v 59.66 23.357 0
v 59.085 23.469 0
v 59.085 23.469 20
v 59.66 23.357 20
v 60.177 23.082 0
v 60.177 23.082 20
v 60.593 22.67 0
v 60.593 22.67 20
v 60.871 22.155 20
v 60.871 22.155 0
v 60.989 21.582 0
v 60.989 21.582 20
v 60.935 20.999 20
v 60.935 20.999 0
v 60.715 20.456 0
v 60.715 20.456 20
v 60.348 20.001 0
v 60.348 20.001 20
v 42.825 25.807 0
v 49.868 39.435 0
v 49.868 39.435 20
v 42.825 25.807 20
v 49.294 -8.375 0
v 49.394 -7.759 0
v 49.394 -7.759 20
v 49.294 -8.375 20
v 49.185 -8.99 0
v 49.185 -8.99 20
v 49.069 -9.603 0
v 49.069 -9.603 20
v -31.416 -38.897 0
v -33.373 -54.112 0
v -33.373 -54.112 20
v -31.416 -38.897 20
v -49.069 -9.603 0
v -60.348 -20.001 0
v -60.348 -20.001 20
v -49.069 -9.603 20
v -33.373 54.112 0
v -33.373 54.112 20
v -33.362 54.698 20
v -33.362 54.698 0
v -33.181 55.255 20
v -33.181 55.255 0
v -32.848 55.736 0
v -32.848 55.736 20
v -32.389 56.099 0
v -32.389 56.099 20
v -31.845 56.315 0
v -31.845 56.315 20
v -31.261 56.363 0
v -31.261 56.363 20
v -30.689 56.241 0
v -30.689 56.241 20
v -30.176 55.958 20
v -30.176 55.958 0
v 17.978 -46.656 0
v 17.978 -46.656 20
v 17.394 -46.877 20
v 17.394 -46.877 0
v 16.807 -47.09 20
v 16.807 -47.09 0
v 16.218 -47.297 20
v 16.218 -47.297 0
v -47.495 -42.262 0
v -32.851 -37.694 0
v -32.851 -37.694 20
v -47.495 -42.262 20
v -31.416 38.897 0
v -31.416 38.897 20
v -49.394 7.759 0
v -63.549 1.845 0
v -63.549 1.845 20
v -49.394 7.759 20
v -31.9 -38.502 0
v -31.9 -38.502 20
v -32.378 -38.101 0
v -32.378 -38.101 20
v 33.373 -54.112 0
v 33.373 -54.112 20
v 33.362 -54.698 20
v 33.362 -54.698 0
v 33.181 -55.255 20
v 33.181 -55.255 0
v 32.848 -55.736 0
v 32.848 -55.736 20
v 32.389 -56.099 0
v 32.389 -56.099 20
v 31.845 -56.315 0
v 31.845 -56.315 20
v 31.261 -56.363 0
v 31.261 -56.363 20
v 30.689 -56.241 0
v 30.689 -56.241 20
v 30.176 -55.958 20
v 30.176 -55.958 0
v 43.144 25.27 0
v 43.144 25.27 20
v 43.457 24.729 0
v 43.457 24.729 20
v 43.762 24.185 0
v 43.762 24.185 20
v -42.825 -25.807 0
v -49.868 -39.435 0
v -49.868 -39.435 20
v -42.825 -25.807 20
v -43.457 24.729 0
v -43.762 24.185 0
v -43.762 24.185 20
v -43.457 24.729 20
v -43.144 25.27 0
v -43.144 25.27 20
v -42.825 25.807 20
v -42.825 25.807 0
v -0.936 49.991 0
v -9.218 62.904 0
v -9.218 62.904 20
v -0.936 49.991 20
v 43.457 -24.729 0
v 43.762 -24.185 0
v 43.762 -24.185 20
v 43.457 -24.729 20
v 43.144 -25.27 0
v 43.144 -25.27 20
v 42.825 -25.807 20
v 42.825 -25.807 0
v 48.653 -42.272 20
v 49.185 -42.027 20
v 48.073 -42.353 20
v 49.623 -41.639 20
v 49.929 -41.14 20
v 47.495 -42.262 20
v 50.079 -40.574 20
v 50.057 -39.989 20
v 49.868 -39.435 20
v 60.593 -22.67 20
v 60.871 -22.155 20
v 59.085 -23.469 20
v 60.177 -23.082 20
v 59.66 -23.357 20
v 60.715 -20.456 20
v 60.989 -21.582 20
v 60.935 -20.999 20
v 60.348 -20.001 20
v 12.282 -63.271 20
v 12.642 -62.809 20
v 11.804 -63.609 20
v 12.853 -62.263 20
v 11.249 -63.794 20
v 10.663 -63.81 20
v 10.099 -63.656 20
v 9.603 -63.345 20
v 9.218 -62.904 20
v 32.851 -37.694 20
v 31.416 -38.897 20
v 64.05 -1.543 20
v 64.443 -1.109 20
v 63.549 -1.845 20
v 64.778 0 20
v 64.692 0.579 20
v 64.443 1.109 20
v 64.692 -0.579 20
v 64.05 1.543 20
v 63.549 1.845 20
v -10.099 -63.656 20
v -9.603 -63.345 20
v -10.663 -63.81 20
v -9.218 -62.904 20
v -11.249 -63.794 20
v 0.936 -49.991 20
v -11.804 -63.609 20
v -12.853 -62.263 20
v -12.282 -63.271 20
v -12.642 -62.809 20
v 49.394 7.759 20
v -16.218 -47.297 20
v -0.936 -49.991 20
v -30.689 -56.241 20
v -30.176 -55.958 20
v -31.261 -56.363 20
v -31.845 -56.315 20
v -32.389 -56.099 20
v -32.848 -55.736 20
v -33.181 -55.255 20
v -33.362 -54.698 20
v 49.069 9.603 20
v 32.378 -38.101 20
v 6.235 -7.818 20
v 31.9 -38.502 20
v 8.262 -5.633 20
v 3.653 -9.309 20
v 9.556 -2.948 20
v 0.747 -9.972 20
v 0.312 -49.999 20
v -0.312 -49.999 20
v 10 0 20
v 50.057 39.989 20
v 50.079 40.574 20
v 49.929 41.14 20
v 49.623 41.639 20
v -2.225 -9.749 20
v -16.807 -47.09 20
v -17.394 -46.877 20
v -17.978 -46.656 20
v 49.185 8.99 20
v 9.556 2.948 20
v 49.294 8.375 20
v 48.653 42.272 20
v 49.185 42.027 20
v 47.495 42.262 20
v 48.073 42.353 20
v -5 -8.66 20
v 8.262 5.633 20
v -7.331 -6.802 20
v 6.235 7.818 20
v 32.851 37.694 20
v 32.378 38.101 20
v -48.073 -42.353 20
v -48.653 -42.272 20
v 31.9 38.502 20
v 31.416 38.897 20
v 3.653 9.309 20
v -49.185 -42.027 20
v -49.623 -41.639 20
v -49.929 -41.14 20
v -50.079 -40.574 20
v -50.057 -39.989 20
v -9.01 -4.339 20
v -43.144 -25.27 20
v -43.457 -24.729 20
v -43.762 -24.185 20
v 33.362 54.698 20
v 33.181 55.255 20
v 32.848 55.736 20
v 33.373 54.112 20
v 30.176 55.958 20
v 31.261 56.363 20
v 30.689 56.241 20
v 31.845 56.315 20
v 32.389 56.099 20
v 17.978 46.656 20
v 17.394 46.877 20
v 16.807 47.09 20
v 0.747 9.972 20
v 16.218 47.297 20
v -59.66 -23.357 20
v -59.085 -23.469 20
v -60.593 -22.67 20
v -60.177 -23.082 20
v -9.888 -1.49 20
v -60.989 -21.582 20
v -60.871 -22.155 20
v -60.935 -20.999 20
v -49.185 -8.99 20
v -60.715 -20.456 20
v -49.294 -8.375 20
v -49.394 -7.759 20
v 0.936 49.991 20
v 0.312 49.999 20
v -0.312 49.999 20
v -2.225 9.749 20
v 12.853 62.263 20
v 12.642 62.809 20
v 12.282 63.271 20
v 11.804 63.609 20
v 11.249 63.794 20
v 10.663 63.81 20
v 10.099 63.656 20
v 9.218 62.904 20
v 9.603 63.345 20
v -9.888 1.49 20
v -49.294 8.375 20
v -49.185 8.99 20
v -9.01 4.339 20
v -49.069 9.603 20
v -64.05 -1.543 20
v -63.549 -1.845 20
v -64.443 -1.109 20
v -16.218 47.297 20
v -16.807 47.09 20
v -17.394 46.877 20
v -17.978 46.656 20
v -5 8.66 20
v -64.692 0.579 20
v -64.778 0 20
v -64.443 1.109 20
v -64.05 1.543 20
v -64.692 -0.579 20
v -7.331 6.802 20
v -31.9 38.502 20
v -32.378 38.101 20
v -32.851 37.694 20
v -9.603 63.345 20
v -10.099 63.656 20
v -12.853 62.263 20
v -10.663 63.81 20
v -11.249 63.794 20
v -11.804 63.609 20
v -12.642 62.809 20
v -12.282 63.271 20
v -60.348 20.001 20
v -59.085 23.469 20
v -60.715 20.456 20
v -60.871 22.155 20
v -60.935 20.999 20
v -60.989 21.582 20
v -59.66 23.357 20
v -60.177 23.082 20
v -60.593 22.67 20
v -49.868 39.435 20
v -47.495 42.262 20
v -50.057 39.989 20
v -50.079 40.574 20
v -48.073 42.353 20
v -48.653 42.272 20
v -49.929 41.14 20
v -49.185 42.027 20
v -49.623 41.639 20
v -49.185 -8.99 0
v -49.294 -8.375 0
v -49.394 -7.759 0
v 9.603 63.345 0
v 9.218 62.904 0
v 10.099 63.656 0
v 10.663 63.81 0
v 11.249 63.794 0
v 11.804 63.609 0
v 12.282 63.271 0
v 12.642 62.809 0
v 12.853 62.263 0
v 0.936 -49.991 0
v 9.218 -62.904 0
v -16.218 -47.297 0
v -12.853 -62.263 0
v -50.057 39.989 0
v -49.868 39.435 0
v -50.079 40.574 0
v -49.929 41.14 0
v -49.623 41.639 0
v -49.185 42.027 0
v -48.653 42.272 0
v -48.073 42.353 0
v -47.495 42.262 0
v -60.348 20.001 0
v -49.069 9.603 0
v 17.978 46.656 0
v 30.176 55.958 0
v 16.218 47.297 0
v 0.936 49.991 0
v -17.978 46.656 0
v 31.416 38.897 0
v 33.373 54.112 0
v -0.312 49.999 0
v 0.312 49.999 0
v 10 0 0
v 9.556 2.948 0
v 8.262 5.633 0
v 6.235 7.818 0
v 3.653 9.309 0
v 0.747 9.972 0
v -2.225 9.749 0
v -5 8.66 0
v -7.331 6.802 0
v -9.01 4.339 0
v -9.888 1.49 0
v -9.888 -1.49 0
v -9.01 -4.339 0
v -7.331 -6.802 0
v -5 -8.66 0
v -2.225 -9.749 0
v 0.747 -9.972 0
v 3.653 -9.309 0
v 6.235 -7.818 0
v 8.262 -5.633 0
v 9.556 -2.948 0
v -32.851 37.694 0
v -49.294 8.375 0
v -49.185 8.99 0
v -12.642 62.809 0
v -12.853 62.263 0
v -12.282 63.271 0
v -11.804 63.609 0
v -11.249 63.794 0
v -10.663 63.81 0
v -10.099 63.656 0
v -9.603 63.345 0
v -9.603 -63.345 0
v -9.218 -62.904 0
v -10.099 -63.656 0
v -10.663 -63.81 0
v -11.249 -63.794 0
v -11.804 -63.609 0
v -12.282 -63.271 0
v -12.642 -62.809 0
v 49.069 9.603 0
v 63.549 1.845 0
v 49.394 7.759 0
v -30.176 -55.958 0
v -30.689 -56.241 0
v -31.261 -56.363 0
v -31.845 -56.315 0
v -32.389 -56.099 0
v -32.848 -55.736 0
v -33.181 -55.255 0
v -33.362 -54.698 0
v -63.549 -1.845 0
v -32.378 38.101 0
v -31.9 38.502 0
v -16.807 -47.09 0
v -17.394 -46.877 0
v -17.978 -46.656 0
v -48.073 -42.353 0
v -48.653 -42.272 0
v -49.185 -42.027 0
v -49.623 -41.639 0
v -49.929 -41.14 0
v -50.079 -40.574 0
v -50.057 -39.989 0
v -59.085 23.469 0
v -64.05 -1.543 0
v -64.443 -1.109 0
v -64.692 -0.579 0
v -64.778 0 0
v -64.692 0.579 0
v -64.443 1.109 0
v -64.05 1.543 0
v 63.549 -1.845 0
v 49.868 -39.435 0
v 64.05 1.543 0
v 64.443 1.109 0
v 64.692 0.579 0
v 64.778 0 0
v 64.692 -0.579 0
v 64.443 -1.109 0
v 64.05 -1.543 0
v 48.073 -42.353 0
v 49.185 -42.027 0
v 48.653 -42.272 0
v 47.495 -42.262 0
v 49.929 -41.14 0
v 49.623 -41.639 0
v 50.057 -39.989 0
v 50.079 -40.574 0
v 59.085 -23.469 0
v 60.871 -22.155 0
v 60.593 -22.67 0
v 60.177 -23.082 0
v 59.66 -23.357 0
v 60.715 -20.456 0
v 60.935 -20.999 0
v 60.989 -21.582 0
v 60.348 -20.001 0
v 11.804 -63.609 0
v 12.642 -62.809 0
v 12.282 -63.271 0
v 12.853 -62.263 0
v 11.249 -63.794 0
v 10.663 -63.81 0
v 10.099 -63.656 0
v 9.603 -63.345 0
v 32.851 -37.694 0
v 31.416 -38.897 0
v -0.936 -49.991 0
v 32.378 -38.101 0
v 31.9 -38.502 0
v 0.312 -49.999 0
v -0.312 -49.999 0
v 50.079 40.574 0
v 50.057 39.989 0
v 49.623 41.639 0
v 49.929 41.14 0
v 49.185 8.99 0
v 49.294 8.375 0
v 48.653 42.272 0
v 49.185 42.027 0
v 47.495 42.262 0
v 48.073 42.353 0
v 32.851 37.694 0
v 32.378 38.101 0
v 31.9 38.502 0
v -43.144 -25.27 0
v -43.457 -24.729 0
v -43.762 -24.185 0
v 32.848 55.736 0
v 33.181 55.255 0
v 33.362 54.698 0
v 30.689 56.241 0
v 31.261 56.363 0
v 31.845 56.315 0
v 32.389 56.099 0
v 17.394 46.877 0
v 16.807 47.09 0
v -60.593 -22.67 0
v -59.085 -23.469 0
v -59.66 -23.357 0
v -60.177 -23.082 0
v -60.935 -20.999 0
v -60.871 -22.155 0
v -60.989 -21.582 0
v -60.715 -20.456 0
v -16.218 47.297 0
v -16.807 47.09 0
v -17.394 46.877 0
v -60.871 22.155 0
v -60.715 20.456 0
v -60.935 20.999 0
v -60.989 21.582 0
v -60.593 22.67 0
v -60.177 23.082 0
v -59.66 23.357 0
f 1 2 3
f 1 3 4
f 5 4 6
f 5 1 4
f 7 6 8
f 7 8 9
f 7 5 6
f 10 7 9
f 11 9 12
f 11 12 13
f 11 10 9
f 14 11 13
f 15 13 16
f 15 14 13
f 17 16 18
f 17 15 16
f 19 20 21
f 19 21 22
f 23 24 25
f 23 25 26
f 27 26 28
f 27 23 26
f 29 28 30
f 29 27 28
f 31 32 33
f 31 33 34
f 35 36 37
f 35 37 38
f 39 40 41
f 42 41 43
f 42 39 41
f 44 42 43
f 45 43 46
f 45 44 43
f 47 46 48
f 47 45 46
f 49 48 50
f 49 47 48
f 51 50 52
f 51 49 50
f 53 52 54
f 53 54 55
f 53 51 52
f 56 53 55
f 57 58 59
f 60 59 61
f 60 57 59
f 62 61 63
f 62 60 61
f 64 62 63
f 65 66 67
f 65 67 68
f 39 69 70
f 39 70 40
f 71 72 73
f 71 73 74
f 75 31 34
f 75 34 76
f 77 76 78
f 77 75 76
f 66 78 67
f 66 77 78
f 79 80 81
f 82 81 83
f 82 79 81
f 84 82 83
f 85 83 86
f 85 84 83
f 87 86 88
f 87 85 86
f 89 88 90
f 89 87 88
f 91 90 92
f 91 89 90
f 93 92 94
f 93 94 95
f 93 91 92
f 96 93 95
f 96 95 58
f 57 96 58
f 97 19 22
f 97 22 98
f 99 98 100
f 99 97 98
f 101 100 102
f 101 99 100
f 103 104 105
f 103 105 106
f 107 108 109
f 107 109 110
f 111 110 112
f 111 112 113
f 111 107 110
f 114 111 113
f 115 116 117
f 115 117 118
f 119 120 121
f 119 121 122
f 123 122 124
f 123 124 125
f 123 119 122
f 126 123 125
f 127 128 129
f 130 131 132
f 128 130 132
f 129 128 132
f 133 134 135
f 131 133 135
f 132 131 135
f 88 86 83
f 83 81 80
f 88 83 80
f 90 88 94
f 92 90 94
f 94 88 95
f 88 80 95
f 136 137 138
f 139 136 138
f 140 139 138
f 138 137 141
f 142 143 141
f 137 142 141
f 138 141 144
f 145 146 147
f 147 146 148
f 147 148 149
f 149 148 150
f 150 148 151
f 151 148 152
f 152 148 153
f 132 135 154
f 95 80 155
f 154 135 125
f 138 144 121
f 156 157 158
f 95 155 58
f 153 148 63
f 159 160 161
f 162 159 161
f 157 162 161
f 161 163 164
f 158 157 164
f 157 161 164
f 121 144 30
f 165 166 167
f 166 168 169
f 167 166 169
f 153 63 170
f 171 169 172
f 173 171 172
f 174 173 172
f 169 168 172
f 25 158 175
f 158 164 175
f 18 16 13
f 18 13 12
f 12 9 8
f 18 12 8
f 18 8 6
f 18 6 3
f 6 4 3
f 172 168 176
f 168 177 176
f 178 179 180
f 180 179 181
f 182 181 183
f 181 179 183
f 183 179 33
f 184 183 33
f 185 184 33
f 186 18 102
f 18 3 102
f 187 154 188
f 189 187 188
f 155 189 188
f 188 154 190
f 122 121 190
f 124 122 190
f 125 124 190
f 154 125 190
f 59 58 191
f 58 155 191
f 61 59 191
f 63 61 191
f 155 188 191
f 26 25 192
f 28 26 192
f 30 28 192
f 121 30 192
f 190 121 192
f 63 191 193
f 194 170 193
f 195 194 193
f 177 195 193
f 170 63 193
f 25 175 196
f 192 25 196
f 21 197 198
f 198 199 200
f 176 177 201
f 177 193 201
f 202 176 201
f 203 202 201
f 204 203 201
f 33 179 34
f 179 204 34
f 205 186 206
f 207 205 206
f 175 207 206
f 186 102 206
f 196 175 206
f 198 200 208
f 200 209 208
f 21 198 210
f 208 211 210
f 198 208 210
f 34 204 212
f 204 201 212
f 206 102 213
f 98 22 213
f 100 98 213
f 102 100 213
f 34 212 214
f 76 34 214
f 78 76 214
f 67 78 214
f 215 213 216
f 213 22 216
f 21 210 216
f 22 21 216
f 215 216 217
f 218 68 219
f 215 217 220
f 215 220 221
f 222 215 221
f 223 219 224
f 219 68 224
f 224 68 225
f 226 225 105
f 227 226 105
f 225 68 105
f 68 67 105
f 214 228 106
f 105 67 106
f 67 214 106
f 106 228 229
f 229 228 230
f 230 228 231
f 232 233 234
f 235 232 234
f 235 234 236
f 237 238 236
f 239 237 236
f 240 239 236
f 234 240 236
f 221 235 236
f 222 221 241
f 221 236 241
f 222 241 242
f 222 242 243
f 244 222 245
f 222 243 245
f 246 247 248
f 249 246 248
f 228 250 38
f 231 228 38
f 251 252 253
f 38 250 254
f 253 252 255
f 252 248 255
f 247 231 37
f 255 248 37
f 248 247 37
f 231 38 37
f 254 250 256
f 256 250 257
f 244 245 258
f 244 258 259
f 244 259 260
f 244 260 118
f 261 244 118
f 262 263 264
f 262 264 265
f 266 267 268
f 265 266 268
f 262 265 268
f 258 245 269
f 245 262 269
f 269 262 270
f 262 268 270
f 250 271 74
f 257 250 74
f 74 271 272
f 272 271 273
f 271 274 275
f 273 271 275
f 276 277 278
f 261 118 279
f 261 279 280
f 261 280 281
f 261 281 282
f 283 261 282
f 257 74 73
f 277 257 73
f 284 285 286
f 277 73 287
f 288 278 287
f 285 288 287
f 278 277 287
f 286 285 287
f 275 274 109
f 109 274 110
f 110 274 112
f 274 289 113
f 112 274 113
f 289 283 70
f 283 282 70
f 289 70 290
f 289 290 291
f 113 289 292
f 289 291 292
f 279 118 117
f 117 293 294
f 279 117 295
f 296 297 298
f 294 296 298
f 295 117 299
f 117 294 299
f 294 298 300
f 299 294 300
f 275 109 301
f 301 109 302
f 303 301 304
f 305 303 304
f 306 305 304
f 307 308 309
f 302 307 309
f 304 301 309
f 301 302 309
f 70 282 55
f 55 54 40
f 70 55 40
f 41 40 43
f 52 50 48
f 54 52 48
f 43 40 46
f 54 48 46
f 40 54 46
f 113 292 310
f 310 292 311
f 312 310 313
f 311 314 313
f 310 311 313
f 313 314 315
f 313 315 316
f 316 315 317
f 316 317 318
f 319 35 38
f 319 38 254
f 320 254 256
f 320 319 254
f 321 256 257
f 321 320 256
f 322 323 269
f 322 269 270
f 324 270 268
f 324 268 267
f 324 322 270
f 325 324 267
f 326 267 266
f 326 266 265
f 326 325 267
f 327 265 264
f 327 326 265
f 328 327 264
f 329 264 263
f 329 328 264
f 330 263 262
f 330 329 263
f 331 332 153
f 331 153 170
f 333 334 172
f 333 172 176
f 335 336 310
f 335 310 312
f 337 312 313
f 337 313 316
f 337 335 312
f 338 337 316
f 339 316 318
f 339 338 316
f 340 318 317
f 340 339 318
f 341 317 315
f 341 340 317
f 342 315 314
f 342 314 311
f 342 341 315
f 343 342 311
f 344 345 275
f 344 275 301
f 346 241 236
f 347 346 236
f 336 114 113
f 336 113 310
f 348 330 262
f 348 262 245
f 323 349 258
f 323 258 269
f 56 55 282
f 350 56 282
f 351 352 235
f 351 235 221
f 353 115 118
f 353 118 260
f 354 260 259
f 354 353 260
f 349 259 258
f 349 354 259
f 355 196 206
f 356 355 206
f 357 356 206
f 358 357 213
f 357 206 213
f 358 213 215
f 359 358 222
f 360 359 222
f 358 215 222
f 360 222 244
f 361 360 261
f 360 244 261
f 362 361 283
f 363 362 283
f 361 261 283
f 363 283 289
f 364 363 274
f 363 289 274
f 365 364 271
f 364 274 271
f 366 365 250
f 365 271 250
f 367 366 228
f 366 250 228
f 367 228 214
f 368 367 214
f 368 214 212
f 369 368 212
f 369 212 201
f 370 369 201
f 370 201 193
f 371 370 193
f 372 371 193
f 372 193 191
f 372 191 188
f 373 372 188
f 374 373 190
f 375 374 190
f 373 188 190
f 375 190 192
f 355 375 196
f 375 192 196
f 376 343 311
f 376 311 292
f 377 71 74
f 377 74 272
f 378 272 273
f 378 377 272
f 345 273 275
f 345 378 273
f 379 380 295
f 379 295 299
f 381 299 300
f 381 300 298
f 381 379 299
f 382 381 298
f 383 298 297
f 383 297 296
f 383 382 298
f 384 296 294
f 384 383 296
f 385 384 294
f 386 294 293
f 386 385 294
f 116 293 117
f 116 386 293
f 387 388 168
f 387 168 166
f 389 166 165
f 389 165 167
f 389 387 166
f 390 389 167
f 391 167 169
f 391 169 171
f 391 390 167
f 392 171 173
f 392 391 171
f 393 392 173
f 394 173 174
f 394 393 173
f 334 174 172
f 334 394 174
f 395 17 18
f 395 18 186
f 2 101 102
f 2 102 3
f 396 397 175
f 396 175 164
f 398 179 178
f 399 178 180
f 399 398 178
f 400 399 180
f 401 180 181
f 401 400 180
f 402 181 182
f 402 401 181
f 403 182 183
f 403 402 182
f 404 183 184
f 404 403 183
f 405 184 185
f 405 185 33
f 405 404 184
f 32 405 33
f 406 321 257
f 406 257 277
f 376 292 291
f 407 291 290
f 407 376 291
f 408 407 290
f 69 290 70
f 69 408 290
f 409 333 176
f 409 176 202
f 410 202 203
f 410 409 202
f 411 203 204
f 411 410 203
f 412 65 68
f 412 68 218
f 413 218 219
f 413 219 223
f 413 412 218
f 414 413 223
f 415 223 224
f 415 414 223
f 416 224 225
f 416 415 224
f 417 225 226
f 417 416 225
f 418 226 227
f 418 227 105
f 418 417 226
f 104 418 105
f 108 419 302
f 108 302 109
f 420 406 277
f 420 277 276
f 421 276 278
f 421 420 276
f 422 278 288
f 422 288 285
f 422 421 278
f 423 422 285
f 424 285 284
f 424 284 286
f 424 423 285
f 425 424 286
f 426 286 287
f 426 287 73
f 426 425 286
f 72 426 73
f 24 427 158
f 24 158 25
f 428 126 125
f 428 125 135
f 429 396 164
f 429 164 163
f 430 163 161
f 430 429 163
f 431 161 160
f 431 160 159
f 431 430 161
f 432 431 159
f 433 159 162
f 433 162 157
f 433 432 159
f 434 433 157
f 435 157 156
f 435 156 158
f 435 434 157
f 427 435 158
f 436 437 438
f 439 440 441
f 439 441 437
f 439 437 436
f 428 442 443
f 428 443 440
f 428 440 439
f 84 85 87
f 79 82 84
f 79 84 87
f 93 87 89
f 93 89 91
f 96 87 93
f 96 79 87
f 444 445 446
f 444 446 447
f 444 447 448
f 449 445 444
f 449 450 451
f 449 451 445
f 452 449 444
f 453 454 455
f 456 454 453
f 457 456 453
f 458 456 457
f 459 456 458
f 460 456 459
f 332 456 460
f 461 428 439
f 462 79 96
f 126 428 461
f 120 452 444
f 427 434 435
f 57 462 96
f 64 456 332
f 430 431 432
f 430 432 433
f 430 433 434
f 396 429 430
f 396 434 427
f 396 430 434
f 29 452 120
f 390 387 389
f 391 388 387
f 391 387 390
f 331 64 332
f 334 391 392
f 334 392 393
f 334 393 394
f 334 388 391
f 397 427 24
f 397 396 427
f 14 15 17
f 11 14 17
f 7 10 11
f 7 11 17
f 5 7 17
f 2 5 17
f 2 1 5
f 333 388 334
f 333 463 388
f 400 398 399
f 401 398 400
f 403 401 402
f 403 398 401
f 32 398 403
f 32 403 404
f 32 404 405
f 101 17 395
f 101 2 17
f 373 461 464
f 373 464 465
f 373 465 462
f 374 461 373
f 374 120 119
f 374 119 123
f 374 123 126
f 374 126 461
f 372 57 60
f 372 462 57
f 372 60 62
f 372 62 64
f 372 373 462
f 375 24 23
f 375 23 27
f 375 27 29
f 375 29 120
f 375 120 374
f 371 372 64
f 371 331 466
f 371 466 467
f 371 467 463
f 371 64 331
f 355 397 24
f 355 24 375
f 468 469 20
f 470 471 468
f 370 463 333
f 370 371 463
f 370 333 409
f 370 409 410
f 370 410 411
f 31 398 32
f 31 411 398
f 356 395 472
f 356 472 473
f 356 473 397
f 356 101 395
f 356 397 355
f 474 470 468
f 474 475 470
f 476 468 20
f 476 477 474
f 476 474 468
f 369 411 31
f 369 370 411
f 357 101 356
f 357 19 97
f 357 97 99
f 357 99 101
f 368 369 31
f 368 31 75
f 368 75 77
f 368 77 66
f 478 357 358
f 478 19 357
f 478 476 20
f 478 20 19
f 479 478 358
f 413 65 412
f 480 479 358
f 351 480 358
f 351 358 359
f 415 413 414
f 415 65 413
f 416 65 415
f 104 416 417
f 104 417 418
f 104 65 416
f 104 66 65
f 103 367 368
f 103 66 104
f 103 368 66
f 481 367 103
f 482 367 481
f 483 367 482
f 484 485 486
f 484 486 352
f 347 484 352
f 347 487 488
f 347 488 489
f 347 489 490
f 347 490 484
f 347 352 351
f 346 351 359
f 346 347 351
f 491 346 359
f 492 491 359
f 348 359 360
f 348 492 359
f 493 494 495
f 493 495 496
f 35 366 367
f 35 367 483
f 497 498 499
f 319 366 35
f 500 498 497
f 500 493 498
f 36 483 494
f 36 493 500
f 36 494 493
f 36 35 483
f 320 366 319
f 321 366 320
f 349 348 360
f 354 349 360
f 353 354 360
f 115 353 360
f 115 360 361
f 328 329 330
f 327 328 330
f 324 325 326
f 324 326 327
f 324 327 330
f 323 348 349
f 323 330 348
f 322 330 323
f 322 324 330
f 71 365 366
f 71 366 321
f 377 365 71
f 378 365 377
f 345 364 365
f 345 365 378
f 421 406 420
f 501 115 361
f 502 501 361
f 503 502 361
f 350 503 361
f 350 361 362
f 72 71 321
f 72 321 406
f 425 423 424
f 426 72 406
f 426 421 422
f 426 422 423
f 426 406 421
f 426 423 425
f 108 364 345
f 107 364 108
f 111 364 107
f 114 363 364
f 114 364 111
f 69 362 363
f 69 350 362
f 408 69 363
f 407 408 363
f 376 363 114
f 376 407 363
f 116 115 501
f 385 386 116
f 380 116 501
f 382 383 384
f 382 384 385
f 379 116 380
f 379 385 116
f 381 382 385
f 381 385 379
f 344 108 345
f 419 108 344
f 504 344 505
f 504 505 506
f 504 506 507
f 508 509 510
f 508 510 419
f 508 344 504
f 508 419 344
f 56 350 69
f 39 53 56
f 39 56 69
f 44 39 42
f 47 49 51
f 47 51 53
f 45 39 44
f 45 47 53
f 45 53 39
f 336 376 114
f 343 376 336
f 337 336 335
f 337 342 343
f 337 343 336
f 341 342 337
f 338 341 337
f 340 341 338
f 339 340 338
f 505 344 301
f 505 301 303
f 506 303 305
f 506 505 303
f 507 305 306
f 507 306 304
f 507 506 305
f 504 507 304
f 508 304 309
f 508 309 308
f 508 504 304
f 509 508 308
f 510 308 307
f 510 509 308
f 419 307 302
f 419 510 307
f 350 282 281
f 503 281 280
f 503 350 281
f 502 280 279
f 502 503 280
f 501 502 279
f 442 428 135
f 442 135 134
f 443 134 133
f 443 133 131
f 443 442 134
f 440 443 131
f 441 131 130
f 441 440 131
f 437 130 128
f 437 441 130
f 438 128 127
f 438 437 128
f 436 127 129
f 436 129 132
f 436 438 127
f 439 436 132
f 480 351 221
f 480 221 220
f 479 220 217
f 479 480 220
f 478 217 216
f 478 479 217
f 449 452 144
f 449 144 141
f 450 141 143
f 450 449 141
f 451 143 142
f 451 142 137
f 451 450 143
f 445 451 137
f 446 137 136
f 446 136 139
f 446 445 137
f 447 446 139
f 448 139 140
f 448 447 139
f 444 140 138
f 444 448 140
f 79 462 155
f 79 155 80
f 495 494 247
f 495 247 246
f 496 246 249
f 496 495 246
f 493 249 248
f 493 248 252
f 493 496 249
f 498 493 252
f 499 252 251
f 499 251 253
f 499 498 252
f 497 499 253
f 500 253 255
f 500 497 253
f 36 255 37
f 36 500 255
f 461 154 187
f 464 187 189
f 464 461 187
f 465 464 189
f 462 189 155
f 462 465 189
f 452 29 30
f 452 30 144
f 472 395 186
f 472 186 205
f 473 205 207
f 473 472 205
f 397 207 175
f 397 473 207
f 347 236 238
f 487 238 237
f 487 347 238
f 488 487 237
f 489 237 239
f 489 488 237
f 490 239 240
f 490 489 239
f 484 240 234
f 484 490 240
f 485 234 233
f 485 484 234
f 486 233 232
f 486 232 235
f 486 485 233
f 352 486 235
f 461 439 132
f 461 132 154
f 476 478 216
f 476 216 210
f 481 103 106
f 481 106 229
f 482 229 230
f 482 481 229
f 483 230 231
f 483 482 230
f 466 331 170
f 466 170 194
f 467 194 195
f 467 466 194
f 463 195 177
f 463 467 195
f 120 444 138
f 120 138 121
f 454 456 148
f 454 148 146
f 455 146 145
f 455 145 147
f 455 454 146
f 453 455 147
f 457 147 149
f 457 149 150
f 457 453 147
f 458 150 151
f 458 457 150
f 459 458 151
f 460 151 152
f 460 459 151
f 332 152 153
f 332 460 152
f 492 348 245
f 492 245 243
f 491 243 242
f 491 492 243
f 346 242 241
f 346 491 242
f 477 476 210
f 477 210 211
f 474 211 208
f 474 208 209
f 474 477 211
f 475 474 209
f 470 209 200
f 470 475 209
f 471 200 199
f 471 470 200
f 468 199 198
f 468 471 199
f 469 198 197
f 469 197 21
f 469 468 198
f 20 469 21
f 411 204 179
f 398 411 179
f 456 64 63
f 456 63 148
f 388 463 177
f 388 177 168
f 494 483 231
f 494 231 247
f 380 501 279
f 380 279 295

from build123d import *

# Parameters (mm, degrees)
EXTRUDE_1_DEPTH     = 20
SKETCH_2_R          = 10
CUT_EXTRUDE_1_DEPTH = 20


with BuildPart() as part:
    # 草圖1 → 填料-伸長1 (new body)
    with BuildSketch(Plane.XY):
        with BuildLine():
            Line((-63.548984366, 1.845434638), (-49.394355, 7.7587173))
            ThreePointArc((-49.394355, 7.7587173), (-49.240387651, 8.682408883), (-49.069148505, 9.603054983))
            Line((-49.069148505, 9.603054983), (-60.347687486, 20.00089143))
            ThreePointArc((-60.347687486, 20.00089143), (-60.871436558, 22.155391024), (-59.085335848, 23.469174052))
            Line((-59.085335848, 23.469174052), (-43.761873299, 24.18467377))
            ThreePointArc((-43.761873299, 24.18467377), (-43.301270189, 25), (-42.825478517, 25.806557109))
            Line((-42.825478517, 25.806557109), (-49.867568859, 39.434814809))
            ThreePointArc((-49.867568859, 39.434814809), (-49.622849737, 41.638514912), (-47.49512382, 42.262184708))
            Line((-47.49512382, 42.262184708), (-32.851063821, 37.693601656))
            ThreePointArc((-32.851063821, 37.693601656), (-32.139380484, 38.302222156), (-31.416423783, 38.897407583))
            Line((-31.416423783, 38.897407583), (-33.37268546, 54.112317527))
            ThreePointArc((-33.37268546, 54.112317527), (-32.389014882, 56.099419383), (-30.176298906, 55.957752164))
            Line((-30.176298906, 55.957752164), (-17.977931217, 46.656124884))
            ThreePointArc((-17.977931217, 46.656124884), (-17.101007166, 46.984631039), (-16.218084684, 47.296656639))
            Line((-16.218084684, 47.296656639), (-12.852563667, 62.263076138))
            ThreePointArc((-12.852563667, 62.263076138), (-11.248586821, 63.793905936), (-9.217766989, 62.903988861))
            Line((-9.217766989, 62.903988861), (-0.936394782, 49.991230879))
            ThreePointArc((-0.936394782, 49.991230879), (0, 50), (0.936394782, 49.991230879))
            Line((0.936394782, 49.991230879), (9.217766989, 62.903988861))
            ThreePointArc((9.217766989, 62.903988861), (11.248586821, 63.793905936), (12.852563667, 62.263076138))
            Line((12.852563667, 62.263076138), (16.218084684, 47.296656639))
            ThreePointArc((16.218084684, 47.296656639), (17.101007166, 46.984631039), (17.977931217, 46.656124884))
            Line((17.977931217, 46.656124884), (30.176298906, 55.957752164))
            ThreePointArc((30.176298906, 55.957752164), (32.389014882, 56.099419383), (33.37268546, 54.112317527))
            Line((33.37268546, 54.112317527), (31.416423783, 38.897407583))
            ThreePointArc((31.416423783, 38.897407583), (32.139380484, 38.302222156), (32.851063821, 37.693601656))
            Line((32.851063821, 37.693601656), (47.49512382, 42.262184708))
            ThreePointArc((47.49512382, 42.262184708), (49.622849737, 41.638514912), (49.867568859, 39.434814809))
            Line((49.867568859, 39.434814809), (42.825478517, 25.806557109))
            ThreePointArc((42.825478517, 25.806557109), (43.301270189, 25), (43.761873299, 24.18467377))
            Line((43.761873299, 24.18467377), (59.085335848, 23.469174052))
            ThreePointArc((59.085335848, 23.469174052), (60.871436558, 22.155391024), (60.347687486, 20.00089143))
            Line((60.347687486, 20.00089143), (49.069148505, 9.603054983))
            ThreePointArc((49.069148505, 9.603054983), (49.240387651, 8.682408883), (49.394355, 7.7587173))
            Line((49.394355, 7.7587173), (63.548984366, 1.845434638))
            ThreePointArc((63.548984366, 1.845434638), (64.778029764, 0), (63.548984366, -1.845434638))
            Line((63.548984366, -1.845434638), (49.394355, -7.7587173))
            ThreePointArc((49.394355, -7.7587173), (49.240387651, -8.682408883), (49.069148505, -9.603054983))
            Line((49.069148505, -9.603054983), (60.347687486, -20.00089143))
            ThreePointArc((60.347687486, -20.00089143), (60.871436558, -22.155391024), (59.085335848, -23.469174052))
            Line((59.085335848, -23.469174052), (43.761873299, -24.18467377))
            ThreePointArc((43.761873299, -24.18467377), (43.301270189, -25), (42.825478517, -25.806557109))
            Line((42.825478517, -25.806557109), (49.867568859, -39.434814809))
            ThreePointArc((49.867568859, -39.434814809), (49.622849737, -41.638514912), (47.49512382, -42.262184708))
            Line((47.49512382, -42.262184708), (32.851063821, -37.693601656))
            ThreePointArc((32.851063821, -37.693601656), (32.139380484, -38.302222156), (31.416423783, -38.897407583))
            Line((31.416423783, -38.897407583), (33.37268546, -54.112317527))
            ThreePointArc((33.37268546, -54.112317527), (32.389014882, -56.099419383), (30.176298906, -55.957752164))
            Line((30.176298906, -55.957752164), (17.977931217, -46.656124884))
            ThreePointArc((17.977931217, -46.656124884), (17.101007166, -46.984631039), (16.218084684, -47.296656639))
            Line((16.218084684, -47.296656639), (12.852563667, -62.263076138))
            ThreePointArc((12.852563667, -62.263076138), (11.248586821, -63.793905936), (9.217766989, -62.903988861))
            Line((9.217766989, -62.903988861), (0.936394782, -49.991230879))
            ThreePointArc((0.936394782, -49.991230879), (0, -50), (-0.936394782, -49.991230879))
            Line((-0.936394782, -49.991230879), (-9.217766989, -62.903988861))
            ThreePointArc((-9.217766989, -62.903988861), (-11.248586821, -63.793905936), (-12.852563667, -62.263076138))
            Line((-12.852563667, -62.263076138), (-16.218084684, -47.296656639))
            ThreePointArc((-16.218084684, -47.296656639), (-17.101007166, -46.984631039), (-17.977931217, -46.656124884))
            Line((-17.977931217, -46.656124884), (-30.176298906, -55.957752164))
            ThreePointArc((-30.176298906, -55.957752164), (-32.389014882, -56.099419383), (-33.37268546, -54.112317527))
            Line((-33.37268546, -54.112317527), (-31.416423783, -38.897407583))
            ThreePointArc((-31.416423783, -38.897407583), (-32.139380484, -38.302222156), (-32.851063821, -37.693601656))
            Line((-32.851063821, -37.693601656), (-47.49512382, -42.262184708))
            ThreePointArc((-47.49512382, -42.262184708), (-49.622849737, -41.638514912), (-49.867568859, -39.434814809))
            Line((-49.867568859, -39.434814809), (-42.825478517, -25.806557109))
            ThreePointArc((-42.825478517, -25.806557109), (-43.301270189, -25), (-43.761873299, -24.18467377))
            Line((-43.761873299, -24.18467377), (-59.085335848, -23.469174052))
            ThreePointArc((-59.085335848, -23.469174052), (-60.871436558, -22.155391024), (-60.347687486, -20.00089143))
            Line((-60.347687486, -20.00089143), (-49.069148505, -9.603054983))
            ThreePointArc((-49.069148505, -9.603054983), (-49.240387651, -8.682408883), (-49.394355, -7.7587173))
            Line((-49.394355, -7.7587173), (-63.548984366, -1.845434638))
            ThreePointArc((-63.548984366, -1.845434638), (-64.778029764, 0), (-63.548984366, 1.845434638))
        make_face()
    extrude(amount=EXTRUDE_1_DEPTH)

    # 草圖2 → 除料-伸長1 (cut)
    with BuildSketch(Plane.XY.offset(20)):
        Circle(SKETCH_2_R)
    extrude(amount=-CUT_EXTRUDE_1_DEPTH, mode=Mode.SUBTRACT)


solid = part.part
